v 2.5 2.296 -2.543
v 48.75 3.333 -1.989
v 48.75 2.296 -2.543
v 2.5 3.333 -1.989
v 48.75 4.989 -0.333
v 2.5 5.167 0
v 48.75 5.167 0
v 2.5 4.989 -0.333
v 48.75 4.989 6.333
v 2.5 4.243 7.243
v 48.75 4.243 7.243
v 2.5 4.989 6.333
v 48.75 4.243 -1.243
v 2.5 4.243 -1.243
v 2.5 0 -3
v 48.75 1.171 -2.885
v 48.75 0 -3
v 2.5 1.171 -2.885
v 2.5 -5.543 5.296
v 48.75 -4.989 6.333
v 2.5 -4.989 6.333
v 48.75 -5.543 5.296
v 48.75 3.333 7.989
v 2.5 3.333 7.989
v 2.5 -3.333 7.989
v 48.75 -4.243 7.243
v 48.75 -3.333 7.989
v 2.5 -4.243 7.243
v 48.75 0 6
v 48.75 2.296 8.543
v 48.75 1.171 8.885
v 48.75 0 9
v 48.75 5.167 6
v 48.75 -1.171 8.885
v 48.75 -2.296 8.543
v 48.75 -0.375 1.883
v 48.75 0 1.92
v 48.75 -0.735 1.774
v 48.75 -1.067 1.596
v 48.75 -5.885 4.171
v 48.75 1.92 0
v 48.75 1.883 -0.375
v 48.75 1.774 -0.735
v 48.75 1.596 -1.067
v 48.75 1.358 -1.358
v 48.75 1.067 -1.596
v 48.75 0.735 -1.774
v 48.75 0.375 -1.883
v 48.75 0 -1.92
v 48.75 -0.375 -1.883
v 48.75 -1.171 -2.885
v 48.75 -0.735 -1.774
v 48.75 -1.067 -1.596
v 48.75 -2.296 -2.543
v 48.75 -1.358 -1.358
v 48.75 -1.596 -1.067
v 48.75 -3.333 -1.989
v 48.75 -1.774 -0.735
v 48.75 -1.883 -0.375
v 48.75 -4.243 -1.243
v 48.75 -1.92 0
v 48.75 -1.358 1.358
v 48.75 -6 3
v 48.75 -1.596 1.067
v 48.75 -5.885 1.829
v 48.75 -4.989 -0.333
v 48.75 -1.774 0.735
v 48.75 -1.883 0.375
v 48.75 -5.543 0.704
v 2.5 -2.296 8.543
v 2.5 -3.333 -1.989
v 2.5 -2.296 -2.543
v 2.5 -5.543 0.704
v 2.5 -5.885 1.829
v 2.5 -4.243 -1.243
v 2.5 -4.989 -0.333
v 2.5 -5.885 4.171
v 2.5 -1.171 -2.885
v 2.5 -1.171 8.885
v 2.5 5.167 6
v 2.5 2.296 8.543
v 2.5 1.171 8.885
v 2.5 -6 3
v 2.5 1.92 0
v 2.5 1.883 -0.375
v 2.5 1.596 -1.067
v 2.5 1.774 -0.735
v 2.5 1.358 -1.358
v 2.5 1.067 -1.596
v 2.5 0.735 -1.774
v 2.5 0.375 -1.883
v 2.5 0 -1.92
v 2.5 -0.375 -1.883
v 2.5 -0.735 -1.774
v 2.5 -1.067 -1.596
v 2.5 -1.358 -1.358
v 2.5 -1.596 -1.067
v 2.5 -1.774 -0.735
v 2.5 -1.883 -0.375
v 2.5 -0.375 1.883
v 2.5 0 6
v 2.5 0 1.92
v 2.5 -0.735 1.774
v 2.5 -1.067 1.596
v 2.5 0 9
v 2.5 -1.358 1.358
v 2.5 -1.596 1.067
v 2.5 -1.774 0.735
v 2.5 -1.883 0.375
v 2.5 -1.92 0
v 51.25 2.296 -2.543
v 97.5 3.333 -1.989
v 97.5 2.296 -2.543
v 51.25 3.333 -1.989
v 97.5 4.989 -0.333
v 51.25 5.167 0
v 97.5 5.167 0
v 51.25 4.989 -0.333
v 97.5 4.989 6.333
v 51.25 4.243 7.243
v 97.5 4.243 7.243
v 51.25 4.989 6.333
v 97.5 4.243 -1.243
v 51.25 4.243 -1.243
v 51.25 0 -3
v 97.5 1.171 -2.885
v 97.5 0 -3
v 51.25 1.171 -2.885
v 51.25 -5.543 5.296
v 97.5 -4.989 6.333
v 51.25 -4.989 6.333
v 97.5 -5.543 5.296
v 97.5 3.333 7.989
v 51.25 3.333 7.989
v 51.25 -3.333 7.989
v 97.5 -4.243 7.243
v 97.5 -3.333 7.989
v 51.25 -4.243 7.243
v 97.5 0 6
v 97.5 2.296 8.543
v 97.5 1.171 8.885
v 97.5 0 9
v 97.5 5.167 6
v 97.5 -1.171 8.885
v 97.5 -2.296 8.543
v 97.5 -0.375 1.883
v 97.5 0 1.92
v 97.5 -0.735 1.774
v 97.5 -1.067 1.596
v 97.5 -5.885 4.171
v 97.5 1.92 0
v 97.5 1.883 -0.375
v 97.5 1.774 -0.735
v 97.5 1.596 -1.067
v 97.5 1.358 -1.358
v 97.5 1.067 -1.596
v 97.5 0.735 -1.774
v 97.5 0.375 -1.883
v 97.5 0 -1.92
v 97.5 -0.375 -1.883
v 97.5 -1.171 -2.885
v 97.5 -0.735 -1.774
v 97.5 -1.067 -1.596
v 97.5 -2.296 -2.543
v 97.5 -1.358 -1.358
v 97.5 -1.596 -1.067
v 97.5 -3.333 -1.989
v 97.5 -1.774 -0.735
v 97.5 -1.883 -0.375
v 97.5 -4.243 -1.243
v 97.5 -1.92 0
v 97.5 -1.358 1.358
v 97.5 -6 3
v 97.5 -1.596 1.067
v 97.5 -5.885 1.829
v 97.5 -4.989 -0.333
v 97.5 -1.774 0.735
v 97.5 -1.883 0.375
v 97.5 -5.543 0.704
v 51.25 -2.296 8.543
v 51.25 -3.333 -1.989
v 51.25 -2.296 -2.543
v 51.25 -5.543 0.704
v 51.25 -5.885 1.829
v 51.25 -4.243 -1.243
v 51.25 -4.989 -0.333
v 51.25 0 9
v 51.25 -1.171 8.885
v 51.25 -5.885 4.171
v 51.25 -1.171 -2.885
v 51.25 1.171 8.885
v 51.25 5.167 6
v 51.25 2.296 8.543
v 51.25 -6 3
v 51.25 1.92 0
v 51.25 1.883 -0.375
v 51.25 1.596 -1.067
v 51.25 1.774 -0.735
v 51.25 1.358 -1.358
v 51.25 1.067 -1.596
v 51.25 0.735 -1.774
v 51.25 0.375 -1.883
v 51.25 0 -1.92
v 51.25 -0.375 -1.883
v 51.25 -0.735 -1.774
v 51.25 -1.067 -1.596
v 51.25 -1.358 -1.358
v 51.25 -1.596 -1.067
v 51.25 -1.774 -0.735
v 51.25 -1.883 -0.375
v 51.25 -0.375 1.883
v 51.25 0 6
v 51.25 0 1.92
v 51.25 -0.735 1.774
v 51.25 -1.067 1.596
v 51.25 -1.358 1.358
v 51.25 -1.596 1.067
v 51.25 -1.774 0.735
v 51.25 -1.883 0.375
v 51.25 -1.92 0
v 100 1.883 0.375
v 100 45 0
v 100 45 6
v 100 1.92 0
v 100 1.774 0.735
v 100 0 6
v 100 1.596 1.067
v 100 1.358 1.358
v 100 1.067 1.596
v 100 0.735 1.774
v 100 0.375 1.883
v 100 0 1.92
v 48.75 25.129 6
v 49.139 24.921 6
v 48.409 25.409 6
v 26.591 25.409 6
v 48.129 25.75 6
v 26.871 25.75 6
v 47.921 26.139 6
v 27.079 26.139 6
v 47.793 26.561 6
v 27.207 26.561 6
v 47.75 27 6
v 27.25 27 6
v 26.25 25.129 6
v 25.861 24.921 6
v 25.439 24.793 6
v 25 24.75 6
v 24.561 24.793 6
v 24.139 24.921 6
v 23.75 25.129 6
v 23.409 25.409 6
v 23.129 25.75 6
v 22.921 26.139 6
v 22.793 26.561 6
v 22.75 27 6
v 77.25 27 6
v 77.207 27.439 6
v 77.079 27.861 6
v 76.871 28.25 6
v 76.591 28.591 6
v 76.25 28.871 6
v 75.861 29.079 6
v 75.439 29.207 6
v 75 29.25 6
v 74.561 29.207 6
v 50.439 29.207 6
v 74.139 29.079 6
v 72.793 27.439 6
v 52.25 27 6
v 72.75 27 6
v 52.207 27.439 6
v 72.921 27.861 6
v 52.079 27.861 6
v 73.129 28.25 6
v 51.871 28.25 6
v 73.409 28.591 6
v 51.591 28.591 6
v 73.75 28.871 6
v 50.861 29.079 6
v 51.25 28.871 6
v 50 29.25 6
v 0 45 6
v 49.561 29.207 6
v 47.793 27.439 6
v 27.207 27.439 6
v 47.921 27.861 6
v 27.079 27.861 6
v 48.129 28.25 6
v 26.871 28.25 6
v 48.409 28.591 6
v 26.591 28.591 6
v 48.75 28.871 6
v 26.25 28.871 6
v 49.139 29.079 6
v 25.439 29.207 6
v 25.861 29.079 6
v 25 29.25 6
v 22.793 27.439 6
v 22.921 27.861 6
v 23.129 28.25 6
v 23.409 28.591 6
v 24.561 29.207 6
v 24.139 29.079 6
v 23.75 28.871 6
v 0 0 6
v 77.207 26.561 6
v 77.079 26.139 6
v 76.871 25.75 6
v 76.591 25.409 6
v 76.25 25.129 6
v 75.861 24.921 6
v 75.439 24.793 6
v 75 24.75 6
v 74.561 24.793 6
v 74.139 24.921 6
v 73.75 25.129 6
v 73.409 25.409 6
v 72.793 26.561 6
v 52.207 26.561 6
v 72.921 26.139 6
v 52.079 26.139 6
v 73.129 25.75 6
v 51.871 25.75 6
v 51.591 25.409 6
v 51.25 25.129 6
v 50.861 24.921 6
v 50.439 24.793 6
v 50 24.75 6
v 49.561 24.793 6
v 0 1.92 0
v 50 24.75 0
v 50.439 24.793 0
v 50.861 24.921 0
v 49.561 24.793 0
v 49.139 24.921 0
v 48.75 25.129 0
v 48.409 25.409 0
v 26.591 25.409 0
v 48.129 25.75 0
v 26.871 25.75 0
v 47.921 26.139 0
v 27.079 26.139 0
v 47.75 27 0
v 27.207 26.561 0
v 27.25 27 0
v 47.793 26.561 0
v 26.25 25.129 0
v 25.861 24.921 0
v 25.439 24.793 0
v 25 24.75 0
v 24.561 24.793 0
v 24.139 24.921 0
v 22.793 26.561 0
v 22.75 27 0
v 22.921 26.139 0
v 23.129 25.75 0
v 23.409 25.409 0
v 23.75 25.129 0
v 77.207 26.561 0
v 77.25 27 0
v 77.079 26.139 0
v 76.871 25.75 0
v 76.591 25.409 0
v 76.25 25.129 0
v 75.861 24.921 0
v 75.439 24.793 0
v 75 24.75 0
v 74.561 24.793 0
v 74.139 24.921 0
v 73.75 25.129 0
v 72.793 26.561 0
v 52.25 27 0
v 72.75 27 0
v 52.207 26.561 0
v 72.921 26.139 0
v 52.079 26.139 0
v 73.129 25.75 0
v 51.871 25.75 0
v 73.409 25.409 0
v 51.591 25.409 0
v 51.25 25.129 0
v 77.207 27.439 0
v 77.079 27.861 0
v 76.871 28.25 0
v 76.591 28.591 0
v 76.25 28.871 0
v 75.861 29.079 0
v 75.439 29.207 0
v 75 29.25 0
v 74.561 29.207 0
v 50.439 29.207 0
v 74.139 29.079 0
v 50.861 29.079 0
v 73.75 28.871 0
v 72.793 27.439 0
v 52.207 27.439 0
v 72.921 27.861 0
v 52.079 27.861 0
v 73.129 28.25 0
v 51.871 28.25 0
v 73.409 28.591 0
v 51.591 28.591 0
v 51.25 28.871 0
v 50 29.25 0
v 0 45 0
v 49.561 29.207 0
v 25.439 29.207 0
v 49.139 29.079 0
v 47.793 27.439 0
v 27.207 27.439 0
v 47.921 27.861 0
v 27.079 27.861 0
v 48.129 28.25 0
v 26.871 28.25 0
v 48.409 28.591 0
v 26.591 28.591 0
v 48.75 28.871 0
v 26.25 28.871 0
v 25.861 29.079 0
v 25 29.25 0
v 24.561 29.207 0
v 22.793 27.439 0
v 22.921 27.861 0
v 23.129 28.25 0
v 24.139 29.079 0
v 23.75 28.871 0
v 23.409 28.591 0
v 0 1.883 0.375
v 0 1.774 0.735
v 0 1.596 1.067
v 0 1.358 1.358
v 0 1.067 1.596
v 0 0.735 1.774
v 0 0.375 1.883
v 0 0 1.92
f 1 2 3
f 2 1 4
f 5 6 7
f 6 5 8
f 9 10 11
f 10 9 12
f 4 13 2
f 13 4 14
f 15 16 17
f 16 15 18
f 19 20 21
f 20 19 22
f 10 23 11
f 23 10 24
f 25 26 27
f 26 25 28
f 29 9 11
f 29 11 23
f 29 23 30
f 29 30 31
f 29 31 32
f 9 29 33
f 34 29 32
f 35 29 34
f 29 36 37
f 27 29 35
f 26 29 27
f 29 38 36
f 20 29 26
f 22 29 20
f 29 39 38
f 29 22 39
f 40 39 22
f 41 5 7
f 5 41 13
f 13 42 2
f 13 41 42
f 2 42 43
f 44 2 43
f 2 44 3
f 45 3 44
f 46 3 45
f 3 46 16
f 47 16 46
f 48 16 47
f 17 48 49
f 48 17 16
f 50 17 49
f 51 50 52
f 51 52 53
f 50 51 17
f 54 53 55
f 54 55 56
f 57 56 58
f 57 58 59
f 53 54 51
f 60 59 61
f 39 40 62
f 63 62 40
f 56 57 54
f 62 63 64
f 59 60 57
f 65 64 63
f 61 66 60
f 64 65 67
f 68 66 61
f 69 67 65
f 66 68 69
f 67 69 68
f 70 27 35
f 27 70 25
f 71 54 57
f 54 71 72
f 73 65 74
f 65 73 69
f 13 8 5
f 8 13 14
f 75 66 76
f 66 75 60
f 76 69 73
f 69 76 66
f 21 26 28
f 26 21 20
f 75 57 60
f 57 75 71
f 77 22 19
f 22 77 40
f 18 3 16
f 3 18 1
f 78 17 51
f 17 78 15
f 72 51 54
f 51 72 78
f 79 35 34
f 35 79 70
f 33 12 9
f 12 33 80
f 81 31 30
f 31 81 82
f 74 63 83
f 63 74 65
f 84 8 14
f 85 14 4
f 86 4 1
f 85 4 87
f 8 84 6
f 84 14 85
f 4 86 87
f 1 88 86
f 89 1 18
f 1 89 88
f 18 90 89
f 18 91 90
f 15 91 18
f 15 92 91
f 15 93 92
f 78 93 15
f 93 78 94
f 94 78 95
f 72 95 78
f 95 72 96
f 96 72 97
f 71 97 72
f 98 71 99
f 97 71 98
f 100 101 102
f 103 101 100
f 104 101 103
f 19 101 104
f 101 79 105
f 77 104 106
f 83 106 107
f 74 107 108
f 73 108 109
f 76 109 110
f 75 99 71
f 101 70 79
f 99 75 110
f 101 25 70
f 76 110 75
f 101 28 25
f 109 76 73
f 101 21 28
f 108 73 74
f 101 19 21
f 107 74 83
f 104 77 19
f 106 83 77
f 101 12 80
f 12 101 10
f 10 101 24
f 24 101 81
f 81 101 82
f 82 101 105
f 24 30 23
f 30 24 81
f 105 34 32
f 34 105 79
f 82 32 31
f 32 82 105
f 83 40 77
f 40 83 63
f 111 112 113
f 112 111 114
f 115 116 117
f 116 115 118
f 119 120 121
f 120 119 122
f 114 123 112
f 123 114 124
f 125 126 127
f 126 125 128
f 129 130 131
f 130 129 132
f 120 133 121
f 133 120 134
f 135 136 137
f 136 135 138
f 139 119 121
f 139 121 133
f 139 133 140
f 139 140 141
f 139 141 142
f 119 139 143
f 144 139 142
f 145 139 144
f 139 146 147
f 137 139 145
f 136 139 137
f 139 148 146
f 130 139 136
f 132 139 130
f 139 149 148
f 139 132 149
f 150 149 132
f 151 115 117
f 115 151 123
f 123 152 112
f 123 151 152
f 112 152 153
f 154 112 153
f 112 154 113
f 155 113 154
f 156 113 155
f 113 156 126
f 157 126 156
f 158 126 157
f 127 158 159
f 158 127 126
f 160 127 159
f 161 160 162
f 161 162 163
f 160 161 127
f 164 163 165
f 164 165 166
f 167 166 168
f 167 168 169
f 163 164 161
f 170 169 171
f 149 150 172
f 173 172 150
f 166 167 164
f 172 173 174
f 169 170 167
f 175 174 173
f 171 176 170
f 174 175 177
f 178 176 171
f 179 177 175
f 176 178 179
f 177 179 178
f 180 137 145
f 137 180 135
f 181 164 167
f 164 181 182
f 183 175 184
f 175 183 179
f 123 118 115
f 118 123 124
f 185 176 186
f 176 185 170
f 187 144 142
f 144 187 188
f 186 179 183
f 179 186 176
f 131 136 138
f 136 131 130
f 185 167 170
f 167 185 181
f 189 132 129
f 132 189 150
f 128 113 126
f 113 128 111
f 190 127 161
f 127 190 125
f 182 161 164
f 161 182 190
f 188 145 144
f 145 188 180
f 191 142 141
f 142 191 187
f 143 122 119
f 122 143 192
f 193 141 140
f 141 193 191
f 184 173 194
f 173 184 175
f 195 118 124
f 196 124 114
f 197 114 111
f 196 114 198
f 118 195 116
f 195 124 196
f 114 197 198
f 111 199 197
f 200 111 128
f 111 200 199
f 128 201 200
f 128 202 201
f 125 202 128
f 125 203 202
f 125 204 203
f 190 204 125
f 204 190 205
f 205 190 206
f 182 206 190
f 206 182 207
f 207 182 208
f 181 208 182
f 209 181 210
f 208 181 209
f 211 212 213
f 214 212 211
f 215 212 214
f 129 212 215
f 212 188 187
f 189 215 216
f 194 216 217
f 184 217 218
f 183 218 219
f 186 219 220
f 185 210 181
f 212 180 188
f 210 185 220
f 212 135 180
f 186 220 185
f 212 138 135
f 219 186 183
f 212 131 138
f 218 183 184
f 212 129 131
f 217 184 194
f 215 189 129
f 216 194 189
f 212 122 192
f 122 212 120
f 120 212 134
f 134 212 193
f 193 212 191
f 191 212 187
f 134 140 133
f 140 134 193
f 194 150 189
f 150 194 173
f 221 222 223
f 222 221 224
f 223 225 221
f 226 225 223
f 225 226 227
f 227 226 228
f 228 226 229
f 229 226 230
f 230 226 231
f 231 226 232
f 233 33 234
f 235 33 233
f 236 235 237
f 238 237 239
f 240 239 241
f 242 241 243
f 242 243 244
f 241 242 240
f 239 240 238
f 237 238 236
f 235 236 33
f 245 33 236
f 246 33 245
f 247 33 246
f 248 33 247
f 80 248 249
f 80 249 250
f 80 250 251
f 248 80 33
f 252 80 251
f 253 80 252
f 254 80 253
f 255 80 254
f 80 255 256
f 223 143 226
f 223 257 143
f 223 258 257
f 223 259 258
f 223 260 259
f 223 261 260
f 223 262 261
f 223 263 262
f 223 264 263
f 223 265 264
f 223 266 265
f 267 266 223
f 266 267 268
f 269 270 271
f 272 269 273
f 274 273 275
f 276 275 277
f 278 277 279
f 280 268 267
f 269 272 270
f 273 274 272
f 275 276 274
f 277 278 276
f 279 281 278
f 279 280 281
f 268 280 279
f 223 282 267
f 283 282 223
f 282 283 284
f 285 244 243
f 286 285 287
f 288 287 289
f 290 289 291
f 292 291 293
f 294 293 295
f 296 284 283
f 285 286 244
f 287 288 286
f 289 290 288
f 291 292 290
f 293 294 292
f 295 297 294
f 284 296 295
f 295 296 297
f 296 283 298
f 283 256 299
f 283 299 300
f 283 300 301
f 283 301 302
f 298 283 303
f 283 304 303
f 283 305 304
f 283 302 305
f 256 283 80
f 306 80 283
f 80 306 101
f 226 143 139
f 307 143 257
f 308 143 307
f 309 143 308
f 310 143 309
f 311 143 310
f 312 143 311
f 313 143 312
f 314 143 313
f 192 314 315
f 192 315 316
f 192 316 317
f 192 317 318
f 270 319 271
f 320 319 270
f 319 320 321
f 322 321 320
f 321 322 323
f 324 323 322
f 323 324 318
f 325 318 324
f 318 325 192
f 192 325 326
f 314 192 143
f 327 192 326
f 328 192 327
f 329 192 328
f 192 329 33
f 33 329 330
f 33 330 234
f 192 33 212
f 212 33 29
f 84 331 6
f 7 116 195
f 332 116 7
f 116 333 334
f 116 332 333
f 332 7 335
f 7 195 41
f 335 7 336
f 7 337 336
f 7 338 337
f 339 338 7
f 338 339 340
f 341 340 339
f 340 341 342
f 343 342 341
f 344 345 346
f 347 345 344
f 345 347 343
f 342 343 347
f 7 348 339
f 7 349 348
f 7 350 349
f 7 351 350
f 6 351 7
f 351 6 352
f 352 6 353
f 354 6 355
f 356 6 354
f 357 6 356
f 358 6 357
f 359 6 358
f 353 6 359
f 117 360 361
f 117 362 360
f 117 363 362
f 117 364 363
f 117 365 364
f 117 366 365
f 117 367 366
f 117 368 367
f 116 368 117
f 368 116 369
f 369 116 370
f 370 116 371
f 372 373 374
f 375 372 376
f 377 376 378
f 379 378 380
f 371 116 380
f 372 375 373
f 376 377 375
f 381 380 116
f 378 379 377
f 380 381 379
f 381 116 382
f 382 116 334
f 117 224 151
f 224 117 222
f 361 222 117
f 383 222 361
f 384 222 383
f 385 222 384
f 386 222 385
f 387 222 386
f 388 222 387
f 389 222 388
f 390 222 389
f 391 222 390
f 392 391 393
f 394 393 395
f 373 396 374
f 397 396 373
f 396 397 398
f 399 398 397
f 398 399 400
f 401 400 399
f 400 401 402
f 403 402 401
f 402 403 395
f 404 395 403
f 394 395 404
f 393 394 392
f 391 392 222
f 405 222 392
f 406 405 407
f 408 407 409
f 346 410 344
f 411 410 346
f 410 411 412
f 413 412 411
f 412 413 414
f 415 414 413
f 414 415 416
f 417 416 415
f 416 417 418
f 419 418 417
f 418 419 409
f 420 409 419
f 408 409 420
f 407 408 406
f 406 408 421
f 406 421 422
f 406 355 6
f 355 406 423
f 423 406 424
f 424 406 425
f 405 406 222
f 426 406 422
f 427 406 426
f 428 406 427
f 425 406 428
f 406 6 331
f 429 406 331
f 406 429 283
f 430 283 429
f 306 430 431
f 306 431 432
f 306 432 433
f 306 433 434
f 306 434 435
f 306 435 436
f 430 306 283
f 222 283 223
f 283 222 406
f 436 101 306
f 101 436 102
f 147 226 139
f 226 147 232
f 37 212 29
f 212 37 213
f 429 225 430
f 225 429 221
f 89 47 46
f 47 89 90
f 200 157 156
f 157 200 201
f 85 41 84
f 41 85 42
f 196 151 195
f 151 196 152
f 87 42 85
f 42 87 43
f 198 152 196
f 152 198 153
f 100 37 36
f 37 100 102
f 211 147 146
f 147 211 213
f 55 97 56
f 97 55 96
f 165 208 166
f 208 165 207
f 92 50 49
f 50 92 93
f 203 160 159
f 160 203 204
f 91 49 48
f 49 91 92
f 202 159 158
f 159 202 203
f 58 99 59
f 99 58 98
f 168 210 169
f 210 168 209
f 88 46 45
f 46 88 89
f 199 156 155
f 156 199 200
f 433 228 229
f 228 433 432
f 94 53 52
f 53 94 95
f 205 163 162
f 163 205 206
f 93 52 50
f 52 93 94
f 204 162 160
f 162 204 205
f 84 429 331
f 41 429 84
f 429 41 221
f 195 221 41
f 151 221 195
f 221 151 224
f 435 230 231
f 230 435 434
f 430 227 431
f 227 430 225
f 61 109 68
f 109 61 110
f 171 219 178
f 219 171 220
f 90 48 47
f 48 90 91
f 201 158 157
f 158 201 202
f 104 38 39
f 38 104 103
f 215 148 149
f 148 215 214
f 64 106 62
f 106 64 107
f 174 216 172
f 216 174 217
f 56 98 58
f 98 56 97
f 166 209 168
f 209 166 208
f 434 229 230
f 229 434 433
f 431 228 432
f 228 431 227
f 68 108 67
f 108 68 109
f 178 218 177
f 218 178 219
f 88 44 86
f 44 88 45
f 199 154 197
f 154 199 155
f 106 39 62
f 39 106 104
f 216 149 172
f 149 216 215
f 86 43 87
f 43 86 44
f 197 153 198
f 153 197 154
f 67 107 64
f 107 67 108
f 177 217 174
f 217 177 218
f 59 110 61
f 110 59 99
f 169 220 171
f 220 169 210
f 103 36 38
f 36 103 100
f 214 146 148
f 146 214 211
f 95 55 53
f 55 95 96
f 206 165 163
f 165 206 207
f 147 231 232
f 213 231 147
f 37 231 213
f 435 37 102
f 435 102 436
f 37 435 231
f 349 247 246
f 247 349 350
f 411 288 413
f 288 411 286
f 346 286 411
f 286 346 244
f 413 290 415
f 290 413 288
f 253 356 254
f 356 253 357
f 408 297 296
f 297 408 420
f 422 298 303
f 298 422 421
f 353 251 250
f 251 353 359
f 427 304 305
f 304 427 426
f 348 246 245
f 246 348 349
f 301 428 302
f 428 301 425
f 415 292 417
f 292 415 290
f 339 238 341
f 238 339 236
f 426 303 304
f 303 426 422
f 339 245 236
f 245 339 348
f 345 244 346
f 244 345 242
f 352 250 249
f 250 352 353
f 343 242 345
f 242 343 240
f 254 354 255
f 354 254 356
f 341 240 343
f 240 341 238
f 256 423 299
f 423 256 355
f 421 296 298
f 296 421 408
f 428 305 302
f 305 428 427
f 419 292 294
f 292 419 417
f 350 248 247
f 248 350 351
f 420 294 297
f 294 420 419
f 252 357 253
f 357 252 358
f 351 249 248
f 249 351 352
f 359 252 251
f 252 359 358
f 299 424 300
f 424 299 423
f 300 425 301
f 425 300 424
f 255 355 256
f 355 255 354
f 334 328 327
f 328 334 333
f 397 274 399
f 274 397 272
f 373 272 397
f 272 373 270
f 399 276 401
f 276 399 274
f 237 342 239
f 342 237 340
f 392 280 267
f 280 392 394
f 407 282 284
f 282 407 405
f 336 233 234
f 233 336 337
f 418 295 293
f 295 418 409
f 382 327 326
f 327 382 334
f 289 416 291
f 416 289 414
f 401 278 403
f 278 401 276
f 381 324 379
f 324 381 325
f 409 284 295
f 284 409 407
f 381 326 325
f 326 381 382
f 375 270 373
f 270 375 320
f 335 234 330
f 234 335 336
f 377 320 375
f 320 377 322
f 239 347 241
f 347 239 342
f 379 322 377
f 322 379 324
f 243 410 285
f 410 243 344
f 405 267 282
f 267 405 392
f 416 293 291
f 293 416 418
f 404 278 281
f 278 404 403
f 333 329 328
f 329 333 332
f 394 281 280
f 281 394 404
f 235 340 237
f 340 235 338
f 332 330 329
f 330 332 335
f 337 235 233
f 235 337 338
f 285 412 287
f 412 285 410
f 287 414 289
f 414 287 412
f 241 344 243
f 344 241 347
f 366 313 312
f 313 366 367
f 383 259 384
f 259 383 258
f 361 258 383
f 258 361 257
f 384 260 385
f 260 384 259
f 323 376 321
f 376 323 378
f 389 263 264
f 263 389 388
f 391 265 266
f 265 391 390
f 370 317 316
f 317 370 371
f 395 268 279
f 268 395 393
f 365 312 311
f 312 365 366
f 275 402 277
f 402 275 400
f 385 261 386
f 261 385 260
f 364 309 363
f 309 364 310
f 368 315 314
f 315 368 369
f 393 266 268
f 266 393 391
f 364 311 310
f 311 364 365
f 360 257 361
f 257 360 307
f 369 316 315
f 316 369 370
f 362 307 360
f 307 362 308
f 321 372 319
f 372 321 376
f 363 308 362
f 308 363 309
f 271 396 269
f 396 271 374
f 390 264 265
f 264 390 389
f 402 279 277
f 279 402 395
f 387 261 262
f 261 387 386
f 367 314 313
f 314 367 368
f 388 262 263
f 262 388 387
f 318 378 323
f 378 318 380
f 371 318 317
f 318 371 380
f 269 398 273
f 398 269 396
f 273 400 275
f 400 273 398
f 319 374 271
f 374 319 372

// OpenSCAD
$fn = 32;

// ----------------------------------------------------------------------
// Hinge leaf: 100 x 51 x 12 mm
// ----------------------------------------------------------------------

// --- parameters (mm) ---
plate_len = 100;          // leaf length, X
plate_w = 45;             // leaf width, Y
plate_t = 6;              // leaf thickness
barrel_d = 12;            // knuckle diameter
barrel_w = 46.25;         // knuckle width
knuckle_n = 2;            // number of knuckles
pin_d = 3.84;             // pin bore
gap = 2.5;                // gap between the knuckles
screw_d = 4.5;            // screw clearance

module leaf() {
  cube([plate_len, plate_w, plate_t]);
}

module knuckles() {
  /* barrels sit on the leaf edge, the pin axis at half the leaf thickness */
  for (i = [0 : knuckle_n - 1])
    translate([gap + i * (barrel_w + gap), 0, plate_t * 0.5])
      rotate([0, 90, 0]) cylinder(h = barrel_w, d = barrel_d);
}

difference() {
  union() {
    leaf();
    knuckles();
  }
  rotate([0, 90, 0]) translate([0, 0, -1])
    cylinder(h = plate_len + 2, d = pin_d);
  translate([25, plate_w * 0.6, -1]) cylinder(h = plate_t + 2, d = screw_d);
  translate([50, plate_w * 0.6, -1]) cylinder(h = plate_t + 2, d = screw_d);
  translate([75, plate_w * 0.6, -1]) cylinder(h = plate_t + 2, d = screw_d);
}
